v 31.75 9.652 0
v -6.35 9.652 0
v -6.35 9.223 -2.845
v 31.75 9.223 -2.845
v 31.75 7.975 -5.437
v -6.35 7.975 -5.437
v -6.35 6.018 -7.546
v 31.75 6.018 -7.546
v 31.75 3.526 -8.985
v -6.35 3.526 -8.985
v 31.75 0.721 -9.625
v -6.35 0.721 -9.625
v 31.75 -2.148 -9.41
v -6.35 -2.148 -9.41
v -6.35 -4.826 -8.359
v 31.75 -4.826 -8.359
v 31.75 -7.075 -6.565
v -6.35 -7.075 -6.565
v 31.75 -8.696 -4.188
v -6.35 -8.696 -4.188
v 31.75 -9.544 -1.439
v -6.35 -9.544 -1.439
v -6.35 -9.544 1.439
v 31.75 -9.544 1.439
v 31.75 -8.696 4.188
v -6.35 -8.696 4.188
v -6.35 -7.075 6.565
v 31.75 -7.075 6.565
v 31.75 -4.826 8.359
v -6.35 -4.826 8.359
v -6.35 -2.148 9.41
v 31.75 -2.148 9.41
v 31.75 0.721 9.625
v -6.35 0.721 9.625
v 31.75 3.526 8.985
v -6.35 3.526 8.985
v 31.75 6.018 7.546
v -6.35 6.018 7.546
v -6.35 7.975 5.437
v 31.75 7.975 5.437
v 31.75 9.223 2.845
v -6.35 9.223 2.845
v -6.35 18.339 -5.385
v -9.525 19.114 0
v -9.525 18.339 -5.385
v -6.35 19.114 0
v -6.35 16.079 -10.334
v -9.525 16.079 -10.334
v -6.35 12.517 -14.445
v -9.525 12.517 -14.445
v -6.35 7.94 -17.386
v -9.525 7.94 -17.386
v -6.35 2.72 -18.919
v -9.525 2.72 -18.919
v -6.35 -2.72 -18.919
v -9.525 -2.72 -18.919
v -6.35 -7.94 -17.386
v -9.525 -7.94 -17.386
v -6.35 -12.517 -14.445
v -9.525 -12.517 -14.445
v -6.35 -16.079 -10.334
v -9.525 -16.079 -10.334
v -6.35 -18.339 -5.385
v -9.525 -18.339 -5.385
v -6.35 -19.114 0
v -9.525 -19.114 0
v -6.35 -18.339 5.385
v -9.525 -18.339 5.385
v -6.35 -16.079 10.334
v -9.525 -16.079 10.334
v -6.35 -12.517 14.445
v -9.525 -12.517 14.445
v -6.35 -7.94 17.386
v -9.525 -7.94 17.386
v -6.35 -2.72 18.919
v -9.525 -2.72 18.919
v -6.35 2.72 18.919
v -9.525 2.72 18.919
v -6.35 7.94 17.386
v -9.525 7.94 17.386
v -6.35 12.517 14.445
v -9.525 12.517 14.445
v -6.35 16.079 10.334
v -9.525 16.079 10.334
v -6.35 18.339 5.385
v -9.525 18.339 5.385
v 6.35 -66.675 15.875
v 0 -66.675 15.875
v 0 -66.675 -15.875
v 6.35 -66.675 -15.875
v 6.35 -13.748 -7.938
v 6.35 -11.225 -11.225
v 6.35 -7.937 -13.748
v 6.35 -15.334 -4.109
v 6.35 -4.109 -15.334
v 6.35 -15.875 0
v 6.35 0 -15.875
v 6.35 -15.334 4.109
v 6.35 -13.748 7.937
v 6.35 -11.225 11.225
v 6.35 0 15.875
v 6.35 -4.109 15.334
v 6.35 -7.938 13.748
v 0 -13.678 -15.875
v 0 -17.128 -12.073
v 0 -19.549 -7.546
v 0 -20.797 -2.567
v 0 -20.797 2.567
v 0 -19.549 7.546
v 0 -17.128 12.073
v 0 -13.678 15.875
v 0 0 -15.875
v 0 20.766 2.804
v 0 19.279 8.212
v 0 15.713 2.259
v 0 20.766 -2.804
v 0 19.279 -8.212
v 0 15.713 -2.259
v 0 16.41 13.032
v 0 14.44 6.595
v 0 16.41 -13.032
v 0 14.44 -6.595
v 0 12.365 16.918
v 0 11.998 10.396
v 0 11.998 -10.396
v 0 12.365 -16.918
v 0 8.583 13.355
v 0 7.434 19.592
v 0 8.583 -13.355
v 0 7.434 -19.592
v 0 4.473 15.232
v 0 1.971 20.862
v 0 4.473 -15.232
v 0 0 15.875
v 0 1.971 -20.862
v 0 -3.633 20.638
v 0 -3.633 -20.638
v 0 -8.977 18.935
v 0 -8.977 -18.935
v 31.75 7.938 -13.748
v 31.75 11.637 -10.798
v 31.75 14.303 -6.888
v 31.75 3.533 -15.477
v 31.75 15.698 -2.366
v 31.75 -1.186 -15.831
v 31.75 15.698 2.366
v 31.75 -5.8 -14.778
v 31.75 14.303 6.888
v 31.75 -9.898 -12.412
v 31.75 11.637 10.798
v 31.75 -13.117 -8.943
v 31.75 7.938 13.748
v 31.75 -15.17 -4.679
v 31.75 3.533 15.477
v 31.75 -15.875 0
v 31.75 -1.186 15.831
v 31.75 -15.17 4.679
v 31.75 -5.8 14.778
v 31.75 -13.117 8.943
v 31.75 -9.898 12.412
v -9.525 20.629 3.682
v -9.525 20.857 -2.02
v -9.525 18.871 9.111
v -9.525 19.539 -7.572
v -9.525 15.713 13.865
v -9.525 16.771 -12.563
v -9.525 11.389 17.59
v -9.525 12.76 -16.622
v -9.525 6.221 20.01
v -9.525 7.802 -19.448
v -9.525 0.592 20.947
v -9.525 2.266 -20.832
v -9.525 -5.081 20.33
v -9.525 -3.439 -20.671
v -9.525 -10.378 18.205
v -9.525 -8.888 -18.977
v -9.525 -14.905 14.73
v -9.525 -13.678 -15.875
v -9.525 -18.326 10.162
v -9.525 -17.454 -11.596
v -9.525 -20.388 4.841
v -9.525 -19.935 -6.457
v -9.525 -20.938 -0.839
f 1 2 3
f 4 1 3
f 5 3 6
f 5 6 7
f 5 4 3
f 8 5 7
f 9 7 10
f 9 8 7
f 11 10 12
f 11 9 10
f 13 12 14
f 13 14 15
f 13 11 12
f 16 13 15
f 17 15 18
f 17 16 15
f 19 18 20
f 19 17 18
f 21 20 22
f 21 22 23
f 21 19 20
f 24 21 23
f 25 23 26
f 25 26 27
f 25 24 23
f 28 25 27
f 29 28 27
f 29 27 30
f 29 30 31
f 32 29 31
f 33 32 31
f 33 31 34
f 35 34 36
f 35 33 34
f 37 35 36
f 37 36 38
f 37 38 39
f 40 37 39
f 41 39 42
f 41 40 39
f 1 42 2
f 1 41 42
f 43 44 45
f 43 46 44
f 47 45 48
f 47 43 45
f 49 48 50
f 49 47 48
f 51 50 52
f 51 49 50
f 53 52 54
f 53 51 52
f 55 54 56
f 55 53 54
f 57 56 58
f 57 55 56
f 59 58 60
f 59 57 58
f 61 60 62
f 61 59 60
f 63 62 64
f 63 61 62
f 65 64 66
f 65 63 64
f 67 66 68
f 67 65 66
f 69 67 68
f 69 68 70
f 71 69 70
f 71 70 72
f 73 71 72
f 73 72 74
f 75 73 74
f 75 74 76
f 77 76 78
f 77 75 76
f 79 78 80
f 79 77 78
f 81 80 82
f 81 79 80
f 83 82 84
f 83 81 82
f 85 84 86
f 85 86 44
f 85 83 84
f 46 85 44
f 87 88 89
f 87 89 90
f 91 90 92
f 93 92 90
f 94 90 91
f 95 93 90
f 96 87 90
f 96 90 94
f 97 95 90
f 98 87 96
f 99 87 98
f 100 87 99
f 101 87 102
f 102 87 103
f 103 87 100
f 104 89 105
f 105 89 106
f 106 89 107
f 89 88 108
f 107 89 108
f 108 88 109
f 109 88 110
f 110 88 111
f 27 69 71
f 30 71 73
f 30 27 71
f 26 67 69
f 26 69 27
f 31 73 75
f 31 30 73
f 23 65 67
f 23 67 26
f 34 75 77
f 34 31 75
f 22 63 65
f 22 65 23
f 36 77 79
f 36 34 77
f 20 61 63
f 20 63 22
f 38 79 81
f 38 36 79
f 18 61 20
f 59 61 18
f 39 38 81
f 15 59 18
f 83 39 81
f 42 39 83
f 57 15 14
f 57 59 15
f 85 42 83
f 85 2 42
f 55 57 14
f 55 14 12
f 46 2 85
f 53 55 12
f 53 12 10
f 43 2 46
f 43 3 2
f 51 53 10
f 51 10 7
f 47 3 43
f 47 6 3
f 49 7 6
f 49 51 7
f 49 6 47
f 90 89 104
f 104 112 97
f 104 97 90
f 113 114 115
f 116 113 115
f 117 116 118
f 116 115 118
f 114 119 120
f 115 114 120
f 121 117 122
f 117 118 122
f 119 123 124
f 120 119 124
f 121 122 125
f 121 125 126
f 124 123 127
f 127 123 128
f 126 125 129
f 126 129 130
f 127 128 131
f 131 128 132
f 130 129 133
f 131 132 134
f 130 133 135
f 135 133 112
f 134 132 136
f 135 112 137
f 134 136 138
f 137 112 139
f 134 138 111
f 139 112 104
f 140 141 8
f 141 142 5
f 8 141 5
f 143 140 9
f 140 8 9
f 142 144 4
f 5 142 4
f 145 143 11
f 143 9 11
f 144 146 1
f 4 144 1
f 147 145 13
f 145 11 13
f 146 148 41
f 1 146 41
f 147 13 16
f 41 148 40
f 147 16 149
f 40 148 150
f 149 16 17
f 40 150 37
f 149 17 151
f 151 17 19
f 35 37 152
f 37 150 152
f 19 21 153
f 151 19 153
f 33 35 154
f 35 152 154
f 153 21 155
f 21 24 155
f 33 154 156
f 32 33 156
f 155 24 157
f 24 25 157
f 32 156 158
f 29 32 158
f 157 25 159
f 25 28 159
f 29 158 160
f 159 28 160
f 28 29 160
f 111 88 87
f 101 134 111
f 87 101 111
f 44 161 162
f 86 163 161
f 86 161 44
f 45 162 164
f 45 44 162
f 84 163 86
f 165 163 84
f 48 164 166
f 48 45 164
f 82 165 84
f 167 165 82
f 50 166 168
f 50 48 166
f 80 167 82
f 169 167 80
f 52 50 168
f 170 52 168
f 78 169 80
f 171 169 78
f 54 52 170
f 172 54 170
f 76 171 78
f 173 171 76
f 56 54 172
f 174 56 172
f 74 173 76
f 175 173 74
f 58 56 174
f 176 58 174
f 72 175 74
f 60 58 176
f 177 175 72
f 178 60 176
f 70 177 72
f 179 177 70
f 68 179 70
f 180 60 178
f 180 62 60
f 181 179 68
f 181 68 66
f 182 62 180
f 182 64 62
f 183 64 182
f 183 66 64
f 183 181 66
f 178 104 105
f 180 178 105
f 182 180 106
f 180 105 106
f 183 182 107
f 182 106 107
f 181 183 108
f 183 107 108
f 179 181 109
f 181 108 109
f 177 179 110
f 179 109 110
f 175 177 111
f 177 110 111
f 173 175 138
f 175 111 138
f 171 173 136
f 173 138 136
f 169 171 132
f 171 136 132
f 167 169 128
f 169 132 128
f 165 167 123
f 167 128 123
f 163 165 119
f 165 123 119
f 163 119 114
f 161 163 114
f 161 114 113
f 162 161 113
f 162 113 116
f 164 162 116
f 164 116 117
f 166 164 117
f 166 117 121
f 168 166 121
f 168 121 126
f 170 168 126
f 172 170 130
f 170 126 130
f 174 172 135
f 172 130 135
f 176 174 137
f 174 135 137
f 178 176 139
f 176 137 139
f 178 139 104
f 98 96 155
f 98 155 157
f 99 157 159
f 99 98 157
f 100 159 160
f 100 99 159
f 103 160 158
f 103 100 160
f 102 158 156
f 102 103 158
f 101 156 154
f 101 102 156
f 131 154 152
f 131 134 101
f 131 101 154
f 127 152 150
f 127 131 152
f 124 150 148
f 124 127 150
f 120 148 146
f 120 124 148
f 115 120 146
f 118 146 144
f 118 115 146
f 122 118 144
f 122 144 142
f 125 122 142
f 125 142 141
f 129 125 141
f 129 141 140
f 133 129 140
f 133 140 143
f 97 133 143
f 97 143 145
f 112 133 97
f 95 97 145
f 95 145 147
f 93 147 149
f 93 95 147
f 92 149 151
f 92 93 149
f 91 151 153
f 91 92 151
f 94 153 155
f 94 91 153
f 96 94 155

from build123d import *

# Parameters (mm, degrees)
SKETCH1_W           = 6.35
SKETCH1_H           = 66.675
BOSS_EXTRUDE1_DEPTH = 15.875
SKETCH2_R           = 15.875
BOSS_EXTRUDE2_DEPTH = 31.75
SKETCH3_R           = 20.955
BOSS_EXTRUDE3_DEPTH = 9.525


with BuildPart() as part:
    # Sketch1 → Boss-Extrude1 (new, symmetric)
    with BuildSketch(Plane.XY):
        with Locations((3.175, -33.3375)):
            Rectangle(SKETCH1_W, SKETCH1_H)
    extrude(amount=BOSS_EXTRUDE1_DEPTH, both=True)

    # Sketch2 → Boss-Extrude2 (add)
    with BuildSketch(Plane.ZY):
        with Locations(Location((0, 0, 0), (0, 0, 270))):
            Circle(SKETCH2_R)
    extrude(amount=-BOSS_EXTRUDE2_DEPTH)

    # Sketch3 → Boss-Extrude3 (add)
    with BuildSketch(Plane.ZY):
        with Locations(Location((0, 0, 0), (0, 0, 220.749054377))):
            Circle(SKETCH3_R)
    extrude(amount=BOSS_EXTRUDE3_DEPTH)

    # Sketch4 → Cut-Revolve1 (revolve, cut)
    with BuildSketch(Plane.XY):
        Polygon((-9.525, 19.1135), (-6.35, 19.1135), (-6.35, 9.652), (31.75, 9.652), (31.75, 0), (-9.525, 0), align=None)
    revolve(axis=Axis((31.75, 0, 0), (-1, 0, 0)), mode=Mode.SUBTRACT)


solid = part.part
